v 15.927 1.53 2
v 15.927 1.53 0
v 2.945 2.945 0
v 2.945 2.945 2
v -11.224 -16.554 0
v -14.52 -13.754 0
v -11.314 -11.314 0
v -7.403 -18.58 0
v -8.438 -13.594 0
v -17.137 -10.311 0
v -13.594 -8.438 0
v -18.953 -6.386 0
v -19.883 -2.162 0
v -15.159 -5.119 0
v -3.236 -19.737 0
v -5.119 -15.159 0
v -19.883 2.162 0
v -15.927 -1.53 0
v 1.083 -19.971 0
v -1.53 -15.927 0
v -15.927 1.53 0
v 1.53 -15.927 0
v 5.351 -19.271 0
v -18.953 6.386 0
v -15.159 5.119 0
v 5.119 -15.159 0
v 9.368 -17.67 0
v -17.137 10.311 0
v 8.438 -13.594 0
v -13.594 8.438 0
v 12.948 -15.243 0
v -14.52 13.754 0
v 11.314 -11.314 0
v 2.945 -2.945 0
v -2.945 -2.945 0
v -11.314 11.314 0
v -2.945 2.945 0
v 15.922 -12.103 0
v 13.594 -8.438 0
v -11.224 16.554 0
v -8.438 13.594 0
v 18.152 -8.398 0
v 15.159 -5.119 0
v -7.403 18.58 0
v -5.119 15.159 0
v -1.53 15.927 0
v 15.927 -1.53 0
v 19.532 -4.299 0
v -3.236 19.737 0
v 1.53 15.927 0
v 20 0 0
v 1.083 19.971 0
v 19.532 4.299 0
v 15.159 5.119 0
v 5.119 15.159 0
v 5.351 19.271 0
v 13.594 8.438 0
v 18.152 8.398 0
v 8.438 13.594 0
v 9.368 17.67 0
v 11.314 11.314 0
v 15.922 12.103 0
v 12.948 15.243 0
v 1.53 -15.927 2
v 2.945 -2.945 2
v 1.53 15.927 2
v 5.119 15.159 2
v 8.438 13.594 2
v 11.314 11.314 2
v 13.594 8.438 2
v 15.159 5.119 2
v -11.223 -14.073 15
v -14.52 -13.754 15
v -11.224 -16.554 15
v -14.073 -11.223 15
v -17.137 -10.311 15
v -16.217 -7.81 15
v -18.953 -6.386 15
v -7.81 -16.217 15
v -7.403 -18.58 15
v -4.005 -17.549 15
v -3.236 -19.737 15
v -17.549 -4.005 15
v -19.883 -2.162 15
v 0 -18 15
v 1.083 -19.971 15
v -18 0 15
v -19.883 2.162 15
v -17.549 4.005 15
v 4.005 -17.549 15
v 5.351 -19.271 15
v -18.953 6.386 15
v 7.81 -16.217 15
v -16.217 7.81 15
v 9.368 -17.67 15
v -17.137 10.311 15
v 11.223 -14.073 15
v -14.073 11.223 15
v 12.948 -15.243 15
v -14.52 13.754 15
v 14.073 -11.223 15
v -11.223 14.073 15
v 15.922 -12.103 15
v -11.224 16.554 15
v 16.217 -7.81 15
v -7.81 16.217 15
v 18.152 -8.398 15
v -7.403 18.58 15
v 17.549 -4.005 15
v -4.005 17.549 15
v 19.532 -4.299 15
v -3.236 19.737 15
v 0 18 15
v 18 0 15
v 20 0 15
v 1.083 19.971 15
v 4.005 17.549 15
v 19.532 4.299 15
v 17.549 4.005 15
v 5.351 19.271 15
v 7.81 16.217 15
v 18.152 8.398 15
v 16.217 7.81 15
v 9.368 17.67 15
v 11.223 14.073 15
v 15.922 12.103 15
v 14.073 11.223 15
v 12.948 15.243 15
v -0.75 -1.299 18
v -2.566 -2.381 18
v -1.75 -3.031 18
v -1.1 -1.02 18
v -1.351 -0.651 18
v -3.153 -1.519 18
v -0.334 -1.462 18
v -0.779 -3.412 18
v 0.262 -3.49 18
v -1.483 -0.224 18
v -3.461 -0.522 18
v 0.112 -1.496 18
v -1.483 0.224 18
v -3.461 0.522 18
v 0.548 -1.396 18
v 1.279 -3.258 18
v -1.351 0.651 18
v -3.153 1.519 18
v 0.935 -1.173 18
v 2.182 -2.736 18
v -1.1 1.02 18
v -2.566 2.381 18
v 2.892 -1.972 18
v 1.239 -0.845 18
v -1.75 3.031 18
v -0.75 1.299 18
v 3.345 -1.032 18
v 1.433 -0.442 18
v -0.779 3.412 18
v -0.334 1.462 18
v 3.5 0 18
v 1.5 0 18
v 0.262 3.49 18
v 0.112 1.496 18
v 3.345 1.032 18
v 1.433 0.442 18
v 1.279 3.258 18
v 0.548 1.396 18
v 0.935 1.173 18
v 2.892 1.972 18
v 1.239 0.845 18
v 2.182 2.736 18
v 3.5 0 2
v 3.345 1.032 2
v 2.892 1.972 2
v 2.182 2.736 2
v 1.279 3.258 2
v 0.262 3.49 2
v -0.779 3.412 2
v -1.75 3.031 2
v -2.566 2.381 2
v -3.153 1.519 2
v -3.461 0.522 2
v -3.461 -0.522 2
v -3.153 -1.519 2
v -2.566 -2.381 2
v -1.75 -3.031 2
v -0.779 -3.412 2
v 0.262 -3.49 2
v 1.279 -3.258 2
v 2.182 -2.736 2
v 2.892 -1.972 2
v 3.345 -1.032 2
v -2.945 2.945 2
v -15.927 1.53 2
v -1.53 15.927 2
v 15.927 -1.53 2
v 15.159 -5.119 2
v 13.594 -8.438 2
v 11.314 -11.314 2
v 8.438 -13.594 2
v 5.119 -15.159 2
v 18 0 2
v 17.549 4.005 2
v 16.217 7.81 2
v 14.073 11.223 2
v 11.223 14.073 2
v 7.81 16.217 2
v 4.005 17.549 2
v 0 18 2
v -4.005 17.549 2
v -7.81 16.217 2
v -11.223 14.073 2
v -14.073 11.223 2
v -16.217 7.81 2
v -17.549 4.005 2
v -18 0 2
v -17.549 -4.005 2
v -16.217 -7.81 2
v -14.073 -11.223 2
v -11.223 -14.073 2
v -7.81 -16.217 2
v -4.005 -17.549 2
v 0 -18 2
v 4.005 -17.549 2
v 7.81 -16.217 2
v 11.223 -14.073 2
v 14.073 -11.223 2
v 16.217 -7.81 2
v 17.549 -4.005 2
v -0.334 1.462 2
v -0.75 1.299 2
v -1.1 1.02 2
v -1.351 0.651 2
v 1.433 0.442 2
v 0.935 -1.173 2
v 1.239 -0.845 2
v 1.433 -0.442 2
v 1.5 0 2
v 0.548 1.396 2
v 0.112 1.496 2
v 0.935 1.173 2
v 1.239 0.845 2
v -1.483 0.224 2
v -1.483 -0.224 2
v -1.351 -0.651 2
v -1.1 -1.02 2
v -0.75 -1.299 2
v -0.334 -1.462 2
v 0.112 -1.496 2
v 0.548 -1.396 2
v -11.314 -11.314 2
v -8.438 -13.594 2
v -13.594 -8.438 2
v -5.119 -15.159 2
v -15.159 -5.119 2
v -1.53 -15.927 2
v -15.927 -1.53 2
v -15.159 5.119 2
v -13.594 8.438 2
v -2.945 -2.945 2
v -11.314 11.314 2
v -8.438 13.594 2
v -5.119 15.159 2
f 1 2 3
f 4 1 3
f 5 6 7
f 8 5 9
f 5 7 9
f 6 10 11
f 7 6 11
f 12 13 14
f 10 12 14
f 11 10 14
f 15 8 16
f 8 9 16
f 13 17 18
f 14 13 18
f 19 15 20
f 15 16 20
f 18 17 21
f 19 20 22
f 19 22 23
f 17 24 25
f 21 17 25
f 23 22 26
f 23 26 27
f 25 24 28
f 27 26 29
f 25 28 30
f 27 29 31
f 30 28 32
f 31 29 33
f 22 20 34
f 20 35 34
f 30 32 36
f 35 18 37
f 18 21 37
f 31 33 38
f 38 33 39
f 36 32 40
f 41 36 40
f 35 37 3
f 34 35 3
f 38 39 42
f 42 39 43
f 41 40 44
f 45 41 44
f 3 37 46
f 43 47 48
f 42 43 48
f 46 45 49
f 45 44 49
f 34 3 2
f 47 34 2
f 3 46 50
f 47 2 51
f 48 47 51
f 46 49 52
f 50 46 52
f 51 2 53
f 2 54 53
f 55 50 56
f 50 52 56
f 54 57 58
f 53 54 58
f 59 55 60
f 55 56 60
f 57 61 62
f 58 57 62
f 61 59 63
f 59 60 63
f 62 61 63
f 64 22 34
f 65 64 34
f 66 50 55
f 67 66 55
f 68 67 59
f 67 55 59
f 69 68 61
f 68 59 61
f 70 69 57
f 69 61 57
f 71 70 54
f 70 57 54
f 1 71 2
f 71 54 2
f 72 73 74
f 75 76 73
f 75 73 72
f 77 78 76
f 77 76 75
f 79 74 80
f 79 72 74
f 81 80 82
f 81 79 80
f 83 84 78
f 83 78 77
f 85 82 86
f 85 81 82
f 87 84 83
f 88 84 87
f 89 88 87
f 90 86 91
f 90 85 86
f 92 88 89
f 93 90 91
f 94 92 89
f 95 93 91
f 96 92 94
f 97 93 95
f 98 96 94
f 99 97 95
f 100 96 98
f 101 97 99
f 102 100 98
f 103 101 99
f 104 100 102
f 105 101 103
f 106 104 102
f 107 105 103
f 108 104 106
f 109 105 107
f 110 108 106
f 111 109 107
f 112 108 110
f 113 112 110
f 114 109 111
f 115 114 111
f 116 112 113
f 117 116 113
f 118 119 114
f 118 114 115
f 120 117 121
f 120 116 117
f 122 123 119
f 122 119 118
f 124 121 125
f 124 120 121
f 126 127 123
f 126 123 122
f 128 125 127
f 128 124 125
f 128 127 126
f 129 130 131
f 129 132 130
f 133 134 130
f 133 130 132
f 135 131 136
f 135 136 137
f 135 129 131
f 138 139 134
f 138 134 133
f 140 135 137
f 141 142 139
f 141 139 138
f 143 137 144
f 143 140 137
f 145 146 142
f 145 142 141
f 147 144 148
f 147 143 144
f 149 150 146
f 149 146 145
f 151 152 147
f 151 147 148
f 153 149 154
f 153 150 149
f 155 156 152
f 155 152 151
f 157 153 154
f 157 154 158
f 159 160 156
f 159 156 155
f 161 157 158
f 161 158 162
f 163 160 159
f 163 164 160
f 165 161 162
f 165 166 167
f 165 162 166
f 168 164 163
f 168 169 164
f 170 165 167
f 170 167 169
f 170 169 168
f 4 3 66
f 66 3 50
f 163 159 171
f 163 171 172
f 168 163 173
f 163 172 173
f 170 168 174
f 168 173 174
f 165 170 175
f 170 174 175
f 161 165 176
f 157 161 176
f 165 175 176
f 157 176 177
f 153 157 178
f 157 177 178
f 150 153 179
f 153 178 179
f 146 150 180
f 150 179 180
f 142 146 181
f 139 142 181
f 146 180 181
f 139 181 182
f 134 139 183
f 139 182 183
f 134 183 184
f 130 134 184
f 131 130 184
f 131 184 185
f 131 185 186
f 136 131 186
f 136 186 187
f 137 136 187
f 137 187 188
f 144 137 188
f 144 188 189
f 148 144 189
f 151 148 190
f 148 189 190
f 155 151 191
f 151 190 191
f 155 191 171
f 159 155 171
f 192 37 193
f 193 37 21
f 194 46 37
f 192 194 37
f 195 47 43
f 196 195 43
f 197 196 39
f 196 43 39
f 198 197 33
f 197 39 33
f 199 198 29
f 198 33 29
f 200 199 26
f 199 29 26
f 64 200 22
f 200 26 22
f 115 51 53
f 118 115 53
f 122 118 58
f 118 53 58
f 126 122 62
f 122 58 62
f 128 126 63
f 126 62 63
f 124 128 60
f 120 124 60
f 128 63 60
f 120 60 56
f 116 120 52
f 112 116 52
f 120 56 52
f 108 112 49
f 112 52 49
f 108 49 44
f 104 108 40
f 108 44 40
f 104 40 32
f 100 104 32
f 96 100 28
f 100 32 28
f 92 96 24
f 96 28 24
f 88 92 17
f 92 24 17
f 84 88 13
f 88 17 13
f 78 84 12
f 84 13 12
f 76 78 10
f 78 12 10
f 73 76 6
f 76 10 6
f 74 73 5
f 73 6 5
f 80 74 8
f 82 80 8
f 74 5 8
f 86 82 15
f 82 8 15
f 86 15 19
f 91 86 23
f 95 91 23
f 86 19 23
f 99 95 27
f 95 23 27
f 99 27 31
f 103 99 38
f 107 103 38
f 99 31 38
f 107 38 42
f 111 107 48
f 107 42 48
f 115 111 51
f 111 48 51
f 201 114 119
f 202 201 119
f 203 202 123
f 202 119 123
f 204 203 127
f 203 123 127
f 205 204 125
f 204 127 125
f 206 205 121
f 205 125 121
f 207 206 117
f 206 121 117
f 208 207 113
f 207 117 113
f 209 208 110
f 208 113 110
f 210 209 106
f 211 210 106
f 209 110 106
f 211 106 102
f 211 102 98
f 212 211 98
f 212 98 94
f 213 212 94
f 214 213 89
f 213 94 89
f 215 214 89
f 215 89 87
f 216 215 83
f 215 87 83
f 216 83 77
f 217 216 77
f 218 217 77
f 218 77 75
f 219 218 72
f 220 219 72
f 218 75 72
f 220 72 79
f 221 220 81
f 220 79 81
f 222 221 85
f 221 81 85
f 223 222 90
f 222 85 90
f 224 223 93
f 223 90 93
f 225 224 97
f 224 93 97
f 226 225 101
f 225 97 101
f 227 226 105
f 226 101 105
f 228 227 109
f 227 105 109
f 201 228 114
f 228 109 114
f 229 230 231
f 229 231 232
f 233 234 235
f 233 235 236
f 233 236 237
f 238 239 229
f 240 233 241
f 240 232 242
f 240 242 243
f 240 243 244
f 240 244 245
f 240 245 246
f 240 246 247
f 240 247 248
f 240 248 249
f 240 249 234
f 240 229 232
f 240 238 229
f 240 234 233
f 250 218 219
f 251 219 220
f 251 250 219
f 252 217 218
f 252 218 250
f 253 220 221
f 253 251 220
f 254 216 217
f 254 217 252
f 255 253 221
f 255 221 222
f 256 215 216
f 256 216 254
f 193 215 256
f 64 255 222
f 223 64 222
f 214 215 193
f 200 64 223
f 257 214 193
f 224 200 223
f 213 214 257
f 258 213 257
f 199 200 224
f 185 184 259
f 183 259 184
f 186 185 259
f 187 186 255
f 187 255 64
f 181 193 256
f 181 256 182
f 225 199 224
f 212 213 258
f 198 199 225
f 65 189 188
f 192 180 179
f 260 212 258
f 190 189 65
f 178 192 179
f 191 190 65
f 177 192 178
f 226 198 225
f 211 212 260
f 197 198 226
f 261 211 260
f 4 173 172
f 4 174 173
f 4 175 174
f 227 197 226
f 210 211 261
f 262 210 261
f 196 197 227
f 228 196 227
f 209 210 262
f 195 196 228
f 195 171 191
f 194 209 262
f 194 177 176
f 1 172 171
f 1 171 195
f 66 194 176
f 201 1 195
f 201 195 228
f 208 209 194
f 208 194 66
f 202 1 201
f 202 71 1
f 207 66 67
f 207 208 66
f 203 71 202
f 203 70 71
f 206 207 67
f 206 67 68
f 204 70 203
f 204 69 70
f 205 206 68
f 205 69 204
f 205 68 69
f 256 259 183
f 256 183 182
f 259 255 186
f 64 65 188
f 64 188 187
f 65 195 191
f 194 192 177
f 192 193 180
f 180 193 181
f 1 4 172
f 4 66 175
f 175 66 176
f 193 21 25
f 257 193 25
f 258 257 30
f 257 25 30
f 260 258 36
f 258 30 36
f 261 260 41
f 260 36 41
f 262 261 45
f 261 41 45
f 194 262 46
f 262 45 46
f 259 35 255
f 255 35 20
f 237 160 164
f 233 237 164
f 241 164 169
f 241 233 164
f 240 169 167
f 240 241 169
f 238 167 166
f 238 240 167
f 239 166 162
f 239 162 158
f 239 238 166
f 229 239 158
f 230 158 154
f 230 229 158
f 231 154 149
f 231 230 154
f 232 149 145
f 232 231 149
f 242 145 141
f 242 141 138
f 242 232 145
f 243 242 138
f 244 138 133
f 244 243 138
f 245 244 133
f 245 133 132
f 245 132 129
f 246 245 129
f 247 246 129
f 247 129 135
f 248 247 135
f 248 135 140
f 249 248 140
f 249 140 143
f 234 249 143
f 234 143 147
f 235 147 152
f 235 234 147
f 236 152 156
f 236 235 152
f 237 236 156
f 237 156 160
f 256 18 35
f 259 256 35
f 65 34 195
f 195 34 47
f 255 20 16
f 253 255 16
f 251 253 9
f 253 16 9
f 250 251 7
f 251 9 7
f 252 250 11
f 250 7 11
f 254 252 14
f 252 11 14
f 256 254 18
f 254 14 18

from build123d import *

# Parameters (mm, degrees)
F0_R     = 20
F1_DEPTH = 15
F2_R     = 18
F3_DEPTH = 13
F4_R     = 3.5
F4_R_2   = 1.5
F5_DEPTH = 16
F7_DEPTH = 2


with BuildPart() as f1:
    # F0 (on Top) → F1 (new body)
    with BuildSketch(Plane.XY):
        Circle(F0_R)
    extrude(amount=F1_DEPTH)

    # F2 (on face) → F3 (cut)
    with BuildSketch(Plane.XY.offset(15)):
        Circle(F2_R)
    extrude(amount=-F3_DEPTH, mode=Mode.SUBTRACT)

    # F4 (on face) → F5 (join)
    with BuildSketch(Plane.XY.offset(2)):
        Circle(F4_R)
        Circle(F4_R_2, mode=Mode.SUBTRACT)
    extrude(amount=F5_DEPTH)

    # F6 (on face) → F7 (cut)
    with BuildSketch(Plane(origin=(0, 0, 0), x_dir=(1, 0, 0), z_dir=(0, 0, -1))):
        with BuildLine():
            Line((-15.926695243, 1.5298296101), (-2.9445433001, 2.9445433001))
            Line((-2.9445433001, 2.9445433001), (-1.5298296101, 15.926695243))
            ThreePointArc((-1.5298296101, 15.926695243), (-11.313708499, 11.313708499), (-15.926695243, 1.5298296101))
        make_face()
        with BuildLine():
            Line((-1.5298296101, -15.926695243), (-2.9445433001, -2.9445433001))
            Line((-2.9445433001, -2.9445433001), (-15.926695243, -1.5298296101))
            ThreePointArc((-15.926695243, -1.5298296101), (-11.313708499, -11.313708499), (-1.5298296101, -15.926695243))
        make_face()
        with BuildLine():
            Line((15.926695243, -1.5298296101), (2.9445433001, -2.9445433001))
            Line((2.9445433001, -2.9445433001), (1.5298296101, -15.926695243))
            ThreePointArc((1.5298296101, -15.926695243), (11.313708499, -11.313708499), (15.926695243, -1.5298296101))
        make_face()
        with BuildLine():
            Line((1.5298296101, 15.926695243), (2.9445433001, 2.9445433001))
            Line((2.9445433001, 2.9445433001), (15.926695243, 1.5298296101))
            ThreePointArc((15.926695243, 1.5298296101), (11.313708499, 11.313708499), (1.5298296101, 15.926695243))
        make_face()
    extrude(amount=-F7_DEPTH, mode=Mode.SUBTRACT)


solid = f1.part
